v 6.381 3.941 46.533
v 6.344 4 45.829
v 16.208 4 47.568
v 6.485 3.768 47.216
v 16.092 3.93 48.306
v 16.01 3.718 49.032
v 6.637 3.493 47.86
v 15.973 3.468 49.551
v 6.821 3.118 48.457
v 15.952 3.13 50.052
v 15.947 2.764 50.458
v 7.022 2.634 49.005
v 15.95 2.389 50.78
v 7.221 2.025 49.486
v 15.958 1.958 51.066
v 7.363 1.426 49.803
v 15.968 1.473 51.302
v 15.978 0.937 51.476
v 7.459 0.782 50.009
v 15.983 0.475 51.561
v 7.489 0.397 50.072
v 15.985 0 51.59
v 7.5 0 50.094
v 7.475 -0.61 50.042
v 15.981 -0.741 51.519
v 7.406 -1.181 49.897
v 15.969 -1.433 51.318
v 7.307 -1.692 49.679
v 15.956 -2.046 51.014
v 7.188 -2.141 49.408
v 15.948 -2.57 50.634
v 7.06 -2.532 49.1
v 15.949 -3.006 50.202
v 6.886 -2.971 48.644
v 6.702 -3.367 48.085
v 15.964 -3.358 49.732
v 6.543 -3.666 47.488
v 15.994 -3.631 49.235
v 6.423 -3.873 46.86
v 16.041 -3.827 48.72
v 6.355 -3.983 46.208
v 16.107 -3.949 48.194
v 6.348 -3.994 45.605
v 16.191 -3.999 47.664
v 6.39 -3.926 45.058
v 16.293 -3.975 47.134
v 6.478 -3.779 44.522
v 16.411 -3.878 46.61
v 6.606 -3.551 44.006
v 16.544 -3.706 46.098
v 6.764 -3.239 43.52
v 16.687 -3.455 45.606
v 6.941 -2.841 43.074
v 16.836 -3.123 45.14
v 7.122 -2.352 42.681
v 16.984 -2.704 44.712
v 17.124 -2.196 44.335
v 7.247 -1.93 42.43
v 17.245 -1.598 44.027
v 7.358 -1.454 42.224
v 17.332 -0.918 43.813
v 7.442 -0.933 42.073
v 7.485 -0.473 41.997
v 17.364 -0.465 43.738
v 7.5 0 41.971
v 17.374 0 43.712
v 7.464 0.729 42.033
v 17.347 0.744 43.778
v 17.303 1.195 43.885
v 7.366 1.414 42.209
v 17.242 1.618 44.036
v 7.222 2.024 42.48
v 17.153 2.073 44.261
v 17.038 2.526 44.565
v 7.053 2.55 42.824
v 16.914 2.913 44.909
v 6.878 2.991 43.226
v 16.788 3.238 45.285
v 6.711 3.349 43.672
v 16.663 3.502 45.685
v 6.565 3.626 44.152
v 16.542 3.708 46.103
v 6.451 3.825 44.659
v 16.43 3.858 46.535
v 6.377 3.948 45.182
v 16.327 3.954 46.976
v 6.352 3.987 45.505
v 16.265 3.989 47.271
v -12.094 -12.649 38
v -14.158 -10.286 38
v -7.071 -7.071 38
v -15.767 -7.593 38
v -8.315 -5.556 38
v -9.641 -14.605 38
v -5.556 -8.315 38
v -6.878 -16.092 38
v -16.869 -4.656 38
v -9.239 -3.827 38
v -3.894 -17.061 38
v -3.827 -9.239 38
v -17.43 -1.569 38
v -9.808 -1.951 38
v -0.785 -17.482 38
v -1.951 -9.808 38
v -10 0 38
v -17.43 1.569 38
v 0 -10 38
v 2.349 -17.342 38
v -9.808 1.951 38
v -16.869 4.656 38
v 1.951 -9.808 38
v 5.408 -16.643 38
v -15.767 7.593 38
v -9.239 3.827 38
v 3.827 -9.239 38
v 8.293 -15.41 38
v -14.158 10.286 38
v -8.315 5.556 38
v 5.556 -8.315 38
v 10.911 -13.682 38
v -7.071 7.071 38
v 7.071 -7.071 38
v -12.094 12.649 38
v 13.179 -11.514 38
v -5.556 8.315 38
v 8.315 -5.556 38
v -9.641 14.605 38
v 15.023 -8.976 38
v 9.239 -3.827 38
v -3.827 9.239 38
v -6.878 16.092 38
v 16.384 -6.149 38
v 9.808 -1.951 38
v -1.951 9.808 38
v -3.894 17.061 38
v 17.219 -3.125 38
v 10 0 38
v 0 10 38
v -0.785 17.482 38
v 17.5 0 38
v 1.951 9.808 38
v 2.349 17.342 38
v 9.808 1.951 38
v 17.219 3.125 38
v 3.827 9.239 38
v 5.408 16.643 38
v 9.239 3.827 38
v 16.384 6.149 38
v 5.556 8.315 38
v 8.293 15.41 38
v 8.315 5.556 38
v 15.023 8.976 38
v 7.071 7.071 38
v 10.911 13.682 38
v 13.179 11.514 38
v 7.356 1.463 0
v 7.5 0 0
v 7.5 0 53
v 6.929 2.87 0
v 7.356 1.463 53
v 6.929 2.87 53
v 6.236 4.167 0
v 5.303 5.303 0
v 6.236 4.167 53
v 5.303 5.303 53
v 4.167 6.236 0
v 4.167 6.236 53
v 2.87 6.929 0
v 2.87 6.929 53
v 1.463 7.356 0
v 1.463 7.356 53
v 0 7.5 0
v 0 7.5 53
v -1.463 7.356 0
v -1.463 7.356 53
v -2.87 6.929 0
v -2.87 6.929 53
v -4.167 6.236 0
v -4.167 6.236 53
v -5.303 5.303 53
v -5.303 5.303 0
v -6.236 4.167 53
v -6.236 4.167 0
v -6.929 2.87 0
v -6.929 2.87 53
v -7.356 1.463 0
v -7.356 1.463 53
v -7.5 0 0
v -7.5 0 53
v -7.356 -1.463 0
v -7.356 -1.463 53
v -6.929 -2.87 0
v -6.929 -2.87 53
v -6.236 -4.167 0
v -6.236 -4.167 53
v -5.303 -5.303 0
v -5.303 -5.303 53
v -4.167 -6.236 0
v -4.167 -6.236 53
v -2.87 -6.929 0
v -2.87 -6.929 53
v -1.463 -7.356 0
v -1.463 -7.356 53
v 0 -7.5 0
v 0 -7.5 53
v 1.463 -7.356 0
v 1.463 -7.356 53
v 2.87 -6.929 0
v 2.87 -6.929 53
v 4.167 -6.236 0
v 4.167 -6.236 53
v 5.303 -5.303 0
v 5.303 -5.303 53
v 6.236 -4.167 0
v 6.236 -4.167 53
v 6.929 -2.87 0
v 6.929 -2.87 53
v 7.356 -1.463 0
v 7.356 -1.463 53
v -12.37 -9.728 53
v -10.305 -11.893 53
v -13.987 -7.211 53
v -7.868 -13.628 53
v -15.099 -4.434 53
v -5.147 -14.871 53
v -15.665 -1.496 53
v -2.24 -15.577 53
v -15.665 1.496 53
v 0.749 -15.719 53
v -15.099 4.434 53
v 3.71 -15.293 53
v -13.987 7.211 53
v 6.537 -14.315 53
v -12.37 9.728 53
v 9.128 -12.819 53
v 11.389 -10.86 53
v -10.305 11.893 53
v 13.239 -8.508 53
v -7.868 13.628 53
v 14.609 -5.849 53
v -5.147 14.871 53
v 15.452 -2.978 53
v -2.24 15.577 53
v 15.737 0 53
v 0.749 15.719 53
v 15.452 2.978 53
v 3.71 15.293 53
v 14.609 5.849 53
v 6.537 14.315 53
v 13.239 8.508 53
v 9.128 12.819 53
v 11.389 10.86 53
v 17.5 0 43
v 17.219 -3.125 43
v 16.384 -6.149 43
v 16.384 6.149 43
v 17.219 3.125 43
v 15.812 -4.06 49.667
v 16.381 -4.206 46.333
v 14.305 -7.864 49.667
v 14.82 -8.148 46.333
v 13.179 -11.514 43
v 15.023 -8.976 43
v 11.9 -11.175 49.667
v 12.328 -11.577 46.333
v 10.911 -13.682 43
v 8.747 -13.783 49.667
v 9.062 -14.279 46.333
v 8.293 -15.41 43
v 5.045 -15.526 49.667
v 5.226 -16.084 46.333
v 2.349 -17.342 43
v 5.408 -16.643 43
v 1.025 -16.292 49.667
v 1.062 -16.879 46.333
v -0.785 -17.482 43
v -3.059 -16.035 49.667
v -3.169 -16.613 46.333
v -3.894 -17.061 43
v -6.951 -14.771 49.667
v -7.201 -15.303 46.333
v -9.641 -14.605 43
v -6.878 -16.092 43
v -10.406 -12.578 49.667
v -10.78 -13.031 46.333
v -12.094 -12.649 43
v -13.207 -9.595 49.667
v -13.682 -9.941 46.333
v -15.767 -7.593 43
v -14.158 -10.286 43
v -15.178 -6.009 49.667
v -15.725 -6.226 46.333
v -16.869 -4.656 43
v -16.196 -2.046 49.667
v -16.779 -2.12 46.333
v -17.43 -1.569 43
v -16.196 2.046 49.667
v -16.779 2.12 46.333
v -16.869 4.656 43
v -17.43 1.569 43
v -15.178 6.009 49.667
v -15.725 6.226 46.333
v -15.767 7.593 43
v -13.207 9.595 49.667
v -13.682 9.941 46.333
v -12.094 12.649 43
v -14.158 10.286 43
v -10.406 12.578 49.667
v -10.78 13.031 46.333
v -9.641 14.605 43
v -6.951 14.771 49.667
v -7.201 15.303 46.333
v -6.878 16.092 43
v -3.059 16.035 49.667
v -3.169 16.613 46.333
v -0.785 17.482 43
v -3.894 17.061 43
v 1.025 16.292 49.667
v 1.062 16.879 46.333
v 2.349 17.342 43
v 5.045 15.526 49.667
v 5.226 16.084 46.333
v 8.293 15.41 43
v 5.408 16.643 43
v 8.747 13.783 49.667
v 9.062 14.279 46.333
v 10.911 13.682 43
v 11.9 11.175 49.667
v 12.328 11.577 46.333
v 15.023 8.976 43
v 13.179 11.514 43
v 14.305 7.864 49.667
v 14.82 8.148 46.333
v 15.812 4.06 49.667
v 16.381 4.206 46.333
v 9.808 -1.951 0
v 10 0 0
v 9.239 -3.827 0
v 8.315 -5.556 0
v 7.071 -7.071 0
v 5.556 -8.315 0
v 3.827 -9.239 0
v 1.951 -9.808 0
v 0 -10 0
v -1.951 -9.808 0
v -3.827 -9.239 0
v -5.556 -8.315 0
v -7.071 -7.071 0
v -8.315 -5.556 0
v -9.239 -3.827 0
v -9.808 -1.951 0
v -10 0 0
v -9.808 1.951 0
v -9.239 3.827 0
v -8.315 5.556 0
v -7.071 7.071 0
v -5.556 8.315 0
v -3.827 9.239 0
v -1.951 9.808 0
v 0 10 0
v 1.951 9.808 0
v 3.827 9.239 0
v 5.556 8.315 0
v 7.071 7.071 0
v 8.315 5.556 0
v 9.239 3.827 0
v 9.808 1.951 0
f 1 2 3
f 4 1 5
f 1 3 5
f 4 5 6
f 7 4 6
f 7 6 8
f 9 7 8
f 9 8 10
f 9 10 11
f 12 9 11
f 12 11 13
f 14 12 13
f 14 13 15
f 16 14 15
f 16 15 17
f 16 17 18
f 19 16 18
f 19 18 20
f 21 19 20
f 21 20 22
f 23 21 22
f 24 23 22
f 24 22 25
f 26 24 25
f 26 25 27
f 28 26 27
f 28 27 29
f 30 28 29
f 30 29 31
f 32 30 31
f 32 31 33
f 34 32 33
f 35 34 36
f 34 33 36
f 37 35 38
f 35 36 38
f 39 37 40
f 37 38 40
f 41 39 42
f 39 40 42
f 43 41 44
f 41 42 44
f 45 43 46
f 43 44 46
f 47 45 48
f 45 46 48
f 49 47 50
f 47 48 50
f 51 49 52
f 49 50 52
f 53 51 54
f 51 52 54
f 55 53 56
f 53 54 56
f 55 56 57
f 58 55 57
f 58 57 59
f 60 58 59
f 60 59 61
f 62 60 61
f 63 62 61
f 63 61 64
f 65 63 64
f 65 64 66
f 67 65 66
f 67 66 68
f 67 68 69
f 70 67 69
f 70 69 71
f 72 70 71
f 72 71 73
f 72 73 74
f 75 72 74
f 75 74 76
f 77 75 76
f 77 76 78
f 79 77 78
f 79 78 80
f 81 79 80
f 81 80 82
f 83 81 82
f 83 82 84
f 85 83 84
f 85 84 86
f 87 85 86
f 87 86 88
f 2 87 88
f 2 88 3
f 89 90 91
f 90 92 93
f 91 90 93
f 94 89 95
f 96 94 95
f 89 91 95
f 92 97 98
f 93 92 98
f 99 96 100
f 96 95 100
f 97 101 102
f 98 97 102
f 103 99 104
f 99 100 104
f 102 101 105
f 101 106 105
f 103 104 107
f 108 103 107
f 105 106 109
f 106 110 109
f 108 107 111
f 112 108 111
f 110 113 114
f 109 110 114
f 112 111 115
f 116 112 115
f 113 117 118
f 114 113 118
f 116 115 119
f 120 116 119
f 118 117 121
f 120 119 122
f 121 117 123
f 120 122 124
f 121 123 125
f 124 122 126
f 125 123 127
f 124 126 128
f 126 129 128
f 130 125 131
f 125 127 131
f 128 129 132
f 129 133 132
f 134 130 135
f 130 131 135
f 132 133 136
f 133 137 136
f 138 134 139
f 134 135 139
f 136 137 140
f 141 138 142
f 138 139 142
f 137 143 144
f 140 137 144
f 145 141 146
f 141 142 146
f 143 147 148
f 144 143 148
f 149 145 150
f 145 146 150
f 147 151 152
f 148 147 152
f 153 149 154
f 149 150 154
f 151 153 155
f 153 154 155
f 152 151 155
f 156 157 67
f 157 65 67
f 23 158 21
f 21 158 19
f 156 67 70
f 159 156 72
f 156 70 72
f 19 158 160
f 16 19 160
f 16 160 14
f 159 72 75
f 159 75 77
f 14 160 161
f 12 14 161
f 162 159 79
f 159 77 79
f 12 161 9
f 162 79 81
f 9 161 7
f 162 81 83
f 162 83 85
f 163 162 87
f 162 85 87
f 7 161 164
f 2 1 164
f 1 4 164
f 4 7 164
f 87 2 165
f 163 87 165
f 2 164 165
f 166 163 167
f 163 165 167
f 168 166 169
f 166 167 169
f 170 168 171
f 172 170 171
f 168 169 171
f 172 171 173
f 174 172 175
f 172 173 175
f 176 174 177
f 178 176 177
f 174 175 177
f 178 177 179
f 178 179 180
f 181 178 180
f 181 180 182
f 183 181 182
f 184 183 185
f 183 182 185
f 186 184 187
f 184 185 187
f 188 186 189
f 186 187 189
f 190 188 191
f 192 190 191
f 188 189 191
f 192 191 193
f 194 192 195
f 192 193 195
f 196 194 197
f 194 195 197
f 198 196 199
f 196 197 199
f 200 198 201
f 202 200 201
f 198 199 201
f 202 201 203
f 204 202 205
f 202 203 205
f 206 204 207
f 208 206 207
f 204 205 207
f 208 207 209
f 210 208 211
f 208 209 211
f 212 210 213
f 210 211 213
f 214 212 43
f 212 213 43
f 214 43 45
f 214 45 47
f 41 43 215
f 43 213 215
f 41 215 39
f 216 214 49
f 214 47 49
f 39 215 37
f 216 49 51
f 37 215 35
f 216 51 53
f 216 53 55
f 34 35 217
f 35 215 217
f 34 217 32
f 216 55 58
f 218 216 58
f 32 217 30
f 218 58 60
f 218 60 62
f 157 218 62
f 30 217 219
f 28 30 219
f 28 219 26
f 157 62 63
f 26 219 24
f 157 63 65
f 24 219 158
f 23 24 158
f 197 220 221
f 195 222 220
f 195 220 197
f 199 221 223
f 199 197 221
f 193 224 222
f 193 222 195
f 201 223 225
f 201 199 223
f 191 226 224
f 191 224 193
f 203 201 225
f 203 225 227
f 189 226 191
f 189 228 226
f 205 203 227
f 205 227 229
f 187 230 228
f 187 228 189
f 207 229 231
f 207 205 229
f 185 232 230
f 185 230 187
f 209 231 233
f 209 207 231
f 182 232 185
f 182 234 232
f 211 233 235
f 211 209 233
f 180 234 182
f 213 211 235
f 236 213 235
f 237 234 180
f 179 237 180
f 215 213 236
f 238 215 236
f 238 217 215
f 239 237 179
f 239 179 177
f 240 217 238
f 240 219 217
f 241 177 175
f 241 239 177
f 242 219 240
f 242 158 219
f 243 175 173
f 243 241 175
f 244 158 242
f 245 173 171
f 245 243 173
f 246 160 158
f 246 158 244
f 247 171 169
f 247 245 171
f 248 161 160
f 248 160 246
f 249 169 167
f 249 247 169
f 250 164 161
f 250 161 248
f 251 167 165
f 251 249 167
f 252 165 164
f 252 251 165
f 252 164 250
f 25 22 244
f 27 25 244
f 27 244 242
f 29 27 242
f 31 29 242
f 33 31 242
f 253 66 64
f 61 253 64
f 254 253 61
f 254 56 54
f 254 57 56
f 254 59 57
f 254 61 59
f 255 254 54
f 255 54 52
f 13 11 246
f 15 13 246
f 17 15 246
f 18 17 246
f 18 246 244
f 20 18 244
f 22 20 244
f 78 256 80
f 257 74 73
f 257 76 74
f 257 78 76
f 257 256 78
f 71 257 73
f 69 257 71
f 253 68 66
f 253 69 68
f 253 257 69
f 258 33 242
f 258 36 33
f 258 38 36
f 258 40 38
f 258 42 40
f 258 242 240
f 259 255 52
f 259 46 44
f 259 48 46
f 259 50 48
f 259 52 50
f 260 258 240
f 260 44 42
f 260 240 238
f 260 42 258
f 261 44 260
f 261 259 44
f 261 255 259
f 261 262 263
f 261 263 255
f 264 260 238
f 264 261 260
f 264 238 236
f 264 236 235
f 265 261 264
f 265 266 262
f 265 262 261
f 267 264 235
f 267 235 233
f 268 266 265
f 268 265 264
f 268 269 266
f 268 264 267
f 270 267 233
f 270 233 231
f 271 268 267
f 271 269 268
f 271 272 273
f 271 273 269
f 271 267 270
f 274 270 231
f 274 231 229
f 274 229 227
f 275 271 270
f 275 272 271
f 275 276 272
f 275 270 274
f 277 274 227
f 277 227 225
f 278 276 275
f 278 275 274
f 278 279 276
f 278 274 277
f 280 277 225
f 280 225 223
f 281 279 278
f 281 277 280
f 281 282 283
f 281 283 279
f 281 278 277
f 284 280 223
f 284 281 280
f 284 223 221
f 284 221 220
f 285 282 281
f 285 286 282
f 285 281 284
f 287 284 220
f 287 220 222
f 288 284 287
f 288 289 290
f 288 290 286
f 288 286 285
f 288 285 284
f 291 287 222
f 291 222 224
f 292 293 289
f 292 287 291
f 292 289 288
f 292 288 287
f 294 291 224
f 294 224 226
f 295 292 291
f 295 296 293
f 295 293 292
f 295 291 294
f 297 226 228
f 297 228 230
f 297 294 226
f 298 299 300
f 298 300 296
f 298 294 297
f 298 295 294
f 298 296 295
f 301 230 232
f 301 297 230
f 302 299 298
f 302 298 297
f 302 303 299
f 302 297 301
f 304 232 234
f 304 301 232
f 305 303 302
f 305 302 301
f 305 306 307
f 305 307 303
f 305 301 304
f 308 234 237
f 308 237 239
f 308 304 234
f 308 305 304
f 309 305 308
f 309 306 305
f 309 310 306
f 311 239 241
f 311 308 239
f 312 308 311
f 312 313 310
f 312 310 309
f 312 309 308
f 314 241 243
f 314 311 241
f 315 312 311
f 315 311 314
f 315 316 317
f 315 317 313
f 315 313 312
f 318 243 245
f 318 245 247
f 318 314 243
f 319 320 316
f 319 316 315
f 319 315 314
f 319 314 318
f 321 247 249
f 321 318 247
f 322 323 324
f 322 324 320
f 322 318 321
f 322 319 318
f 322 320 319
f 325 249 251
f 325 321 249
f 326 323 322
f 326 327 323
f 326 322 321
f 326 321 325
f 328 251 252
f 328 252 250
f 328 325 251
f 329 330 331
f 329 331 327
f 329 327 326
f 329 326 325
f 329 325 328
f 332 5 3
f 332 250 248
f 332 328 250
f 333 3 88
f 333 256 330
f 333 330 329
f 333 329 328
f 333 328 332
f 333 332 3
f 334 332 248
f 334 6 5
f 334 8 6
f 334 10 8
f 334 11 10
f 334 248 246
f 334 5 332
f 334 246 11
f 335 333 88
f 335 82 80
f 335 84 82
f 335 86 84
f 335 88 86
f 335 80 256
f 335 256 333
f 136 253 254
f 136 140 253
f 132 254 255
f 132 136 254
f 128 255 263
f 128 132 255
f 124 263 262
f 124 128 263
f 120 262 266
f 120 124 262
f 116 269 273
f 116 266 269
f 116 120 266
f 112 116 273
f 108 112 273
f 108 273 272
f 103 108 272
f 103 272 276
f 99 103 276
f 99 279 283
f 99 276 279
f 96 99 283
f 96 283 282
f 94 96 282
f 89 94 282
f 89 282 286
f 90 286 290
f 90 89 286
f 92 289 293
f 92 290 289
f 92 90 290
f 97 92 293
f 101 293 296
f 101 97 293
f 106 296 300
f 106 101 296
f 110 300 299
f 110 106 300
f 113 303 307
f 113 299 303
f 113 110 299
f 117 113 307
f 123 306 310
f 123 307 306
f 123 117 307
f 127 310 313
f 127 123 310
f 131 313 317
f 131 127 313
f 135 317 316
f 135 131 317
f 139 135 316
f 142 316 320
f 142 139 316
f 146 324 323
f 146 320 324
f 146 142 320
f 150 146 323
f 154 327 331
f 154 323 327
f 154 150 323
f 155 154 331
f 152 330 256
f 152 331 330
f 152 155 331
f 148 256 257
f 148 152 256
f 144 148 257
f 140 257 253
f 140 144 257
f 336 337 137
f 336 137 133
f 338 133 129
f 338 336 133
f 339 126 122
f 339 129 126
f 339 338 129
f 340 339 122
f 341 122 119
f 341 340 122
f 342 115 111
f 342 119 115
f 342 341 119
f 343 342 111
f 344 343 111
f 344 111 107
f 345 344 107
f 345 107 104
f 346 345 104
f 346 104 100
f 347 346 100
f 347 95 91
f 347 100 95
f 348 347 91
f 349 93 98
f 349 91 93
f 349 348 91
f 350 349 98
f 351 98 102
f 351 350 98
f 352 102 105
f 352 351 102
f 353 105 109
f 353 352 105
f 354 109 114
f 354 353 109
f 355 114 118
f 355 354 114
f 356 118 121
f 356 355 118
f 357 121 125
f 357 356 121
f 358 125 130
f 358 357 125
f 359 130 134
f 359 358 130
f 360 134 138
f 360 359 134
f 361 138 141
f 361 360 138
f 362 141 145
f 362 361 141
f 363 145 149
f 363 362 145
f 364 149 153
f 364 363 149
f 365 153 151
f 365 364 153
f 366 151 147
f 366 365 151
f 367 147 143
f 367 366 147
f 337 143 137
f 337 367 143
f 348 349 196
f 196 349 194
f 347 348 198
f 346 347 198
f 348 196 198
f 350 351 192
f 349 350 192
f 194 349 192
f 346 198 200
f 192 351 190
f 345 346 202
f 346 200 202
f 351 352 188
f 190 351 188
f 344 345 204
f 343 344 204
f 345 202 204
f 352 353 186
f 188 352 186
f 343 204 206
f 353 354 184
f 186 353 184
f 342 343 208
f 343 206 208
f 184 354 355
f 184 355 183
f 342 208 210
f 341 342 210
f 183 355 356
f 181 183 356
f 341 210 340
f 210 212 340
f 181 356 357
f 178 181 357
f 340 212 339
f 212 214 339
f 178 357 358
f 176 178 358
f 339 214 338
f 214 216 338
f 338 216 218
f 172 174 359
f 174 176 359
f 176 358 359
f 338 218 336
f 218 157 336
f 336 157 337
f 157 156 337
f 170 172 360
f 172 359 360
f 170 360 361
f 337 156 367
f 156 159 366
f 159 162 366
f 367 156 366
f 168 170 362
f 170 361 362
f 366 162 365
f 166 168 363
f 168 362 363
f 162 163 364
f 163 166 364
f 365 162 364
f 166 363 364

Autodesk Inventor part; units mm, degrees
ref_plane "YZ Plane" through (0, 0, 0) normal (1, 0, 0) x (0, 1, 0)
ref_plane "XY Plane" through (0, 0, 0) normal (0, 0, 1) x (1, 0, 0)
sketch "Sketch1" plane through (0, 0, 0) normal (0, 0, 1) x (1, 0, 0)
  circle A0 centre (0, 0) radius 10
  dimension "d0" = 20
extrude "Extrusion1" add sketch "Sketch1" along normal blind 38
sketch "Sketch2" plane through (0, 0, 38) normal (0, 0, 1) x (1, 0, 0)
  circle A0 centre (0, 0) radius 17.5
  dimension "d3" = 35
extrude "Extrusion2" add sketch "Sketch2" along normal blind 5
sketch "Sketch3" plane through (0, 0, 43) normal (0, 0, 1) x (1, 0, 0)
  circle A0 centre (0, 0) radius 17.5 projected
extrude "Extrusion3" add sketch "Sketch3" along normal blind 10 draft -10
sketch "Sketch4" plane through (0, 0, 53) normal (0, 0, 1) x (1, 0, 0)
  circle A0 centre (0, 0) radius 7.5
  dimension "d9" = 15
extrude "Extrusion4" cut sketch "Sketch4" against normal through all
ref_plane "Work Plane1" through (15.7367, 0, 53) normal (0.9848, 0, 0.1736) x (0, 1, 0)
sketch "Sketch6" plane through (15.7367, 0, 53) normal (0.9848, 0, 0.1736) x (0, 1, 0)
  circle A0 centre (0, -5.4313) radius 4
  point P0 (0, -49.4622)
  dimension "d12" = 8
extrude "Extrusion5" cut sketch "Sketch6" against normal blind 13.25
properties part number "Midle"
